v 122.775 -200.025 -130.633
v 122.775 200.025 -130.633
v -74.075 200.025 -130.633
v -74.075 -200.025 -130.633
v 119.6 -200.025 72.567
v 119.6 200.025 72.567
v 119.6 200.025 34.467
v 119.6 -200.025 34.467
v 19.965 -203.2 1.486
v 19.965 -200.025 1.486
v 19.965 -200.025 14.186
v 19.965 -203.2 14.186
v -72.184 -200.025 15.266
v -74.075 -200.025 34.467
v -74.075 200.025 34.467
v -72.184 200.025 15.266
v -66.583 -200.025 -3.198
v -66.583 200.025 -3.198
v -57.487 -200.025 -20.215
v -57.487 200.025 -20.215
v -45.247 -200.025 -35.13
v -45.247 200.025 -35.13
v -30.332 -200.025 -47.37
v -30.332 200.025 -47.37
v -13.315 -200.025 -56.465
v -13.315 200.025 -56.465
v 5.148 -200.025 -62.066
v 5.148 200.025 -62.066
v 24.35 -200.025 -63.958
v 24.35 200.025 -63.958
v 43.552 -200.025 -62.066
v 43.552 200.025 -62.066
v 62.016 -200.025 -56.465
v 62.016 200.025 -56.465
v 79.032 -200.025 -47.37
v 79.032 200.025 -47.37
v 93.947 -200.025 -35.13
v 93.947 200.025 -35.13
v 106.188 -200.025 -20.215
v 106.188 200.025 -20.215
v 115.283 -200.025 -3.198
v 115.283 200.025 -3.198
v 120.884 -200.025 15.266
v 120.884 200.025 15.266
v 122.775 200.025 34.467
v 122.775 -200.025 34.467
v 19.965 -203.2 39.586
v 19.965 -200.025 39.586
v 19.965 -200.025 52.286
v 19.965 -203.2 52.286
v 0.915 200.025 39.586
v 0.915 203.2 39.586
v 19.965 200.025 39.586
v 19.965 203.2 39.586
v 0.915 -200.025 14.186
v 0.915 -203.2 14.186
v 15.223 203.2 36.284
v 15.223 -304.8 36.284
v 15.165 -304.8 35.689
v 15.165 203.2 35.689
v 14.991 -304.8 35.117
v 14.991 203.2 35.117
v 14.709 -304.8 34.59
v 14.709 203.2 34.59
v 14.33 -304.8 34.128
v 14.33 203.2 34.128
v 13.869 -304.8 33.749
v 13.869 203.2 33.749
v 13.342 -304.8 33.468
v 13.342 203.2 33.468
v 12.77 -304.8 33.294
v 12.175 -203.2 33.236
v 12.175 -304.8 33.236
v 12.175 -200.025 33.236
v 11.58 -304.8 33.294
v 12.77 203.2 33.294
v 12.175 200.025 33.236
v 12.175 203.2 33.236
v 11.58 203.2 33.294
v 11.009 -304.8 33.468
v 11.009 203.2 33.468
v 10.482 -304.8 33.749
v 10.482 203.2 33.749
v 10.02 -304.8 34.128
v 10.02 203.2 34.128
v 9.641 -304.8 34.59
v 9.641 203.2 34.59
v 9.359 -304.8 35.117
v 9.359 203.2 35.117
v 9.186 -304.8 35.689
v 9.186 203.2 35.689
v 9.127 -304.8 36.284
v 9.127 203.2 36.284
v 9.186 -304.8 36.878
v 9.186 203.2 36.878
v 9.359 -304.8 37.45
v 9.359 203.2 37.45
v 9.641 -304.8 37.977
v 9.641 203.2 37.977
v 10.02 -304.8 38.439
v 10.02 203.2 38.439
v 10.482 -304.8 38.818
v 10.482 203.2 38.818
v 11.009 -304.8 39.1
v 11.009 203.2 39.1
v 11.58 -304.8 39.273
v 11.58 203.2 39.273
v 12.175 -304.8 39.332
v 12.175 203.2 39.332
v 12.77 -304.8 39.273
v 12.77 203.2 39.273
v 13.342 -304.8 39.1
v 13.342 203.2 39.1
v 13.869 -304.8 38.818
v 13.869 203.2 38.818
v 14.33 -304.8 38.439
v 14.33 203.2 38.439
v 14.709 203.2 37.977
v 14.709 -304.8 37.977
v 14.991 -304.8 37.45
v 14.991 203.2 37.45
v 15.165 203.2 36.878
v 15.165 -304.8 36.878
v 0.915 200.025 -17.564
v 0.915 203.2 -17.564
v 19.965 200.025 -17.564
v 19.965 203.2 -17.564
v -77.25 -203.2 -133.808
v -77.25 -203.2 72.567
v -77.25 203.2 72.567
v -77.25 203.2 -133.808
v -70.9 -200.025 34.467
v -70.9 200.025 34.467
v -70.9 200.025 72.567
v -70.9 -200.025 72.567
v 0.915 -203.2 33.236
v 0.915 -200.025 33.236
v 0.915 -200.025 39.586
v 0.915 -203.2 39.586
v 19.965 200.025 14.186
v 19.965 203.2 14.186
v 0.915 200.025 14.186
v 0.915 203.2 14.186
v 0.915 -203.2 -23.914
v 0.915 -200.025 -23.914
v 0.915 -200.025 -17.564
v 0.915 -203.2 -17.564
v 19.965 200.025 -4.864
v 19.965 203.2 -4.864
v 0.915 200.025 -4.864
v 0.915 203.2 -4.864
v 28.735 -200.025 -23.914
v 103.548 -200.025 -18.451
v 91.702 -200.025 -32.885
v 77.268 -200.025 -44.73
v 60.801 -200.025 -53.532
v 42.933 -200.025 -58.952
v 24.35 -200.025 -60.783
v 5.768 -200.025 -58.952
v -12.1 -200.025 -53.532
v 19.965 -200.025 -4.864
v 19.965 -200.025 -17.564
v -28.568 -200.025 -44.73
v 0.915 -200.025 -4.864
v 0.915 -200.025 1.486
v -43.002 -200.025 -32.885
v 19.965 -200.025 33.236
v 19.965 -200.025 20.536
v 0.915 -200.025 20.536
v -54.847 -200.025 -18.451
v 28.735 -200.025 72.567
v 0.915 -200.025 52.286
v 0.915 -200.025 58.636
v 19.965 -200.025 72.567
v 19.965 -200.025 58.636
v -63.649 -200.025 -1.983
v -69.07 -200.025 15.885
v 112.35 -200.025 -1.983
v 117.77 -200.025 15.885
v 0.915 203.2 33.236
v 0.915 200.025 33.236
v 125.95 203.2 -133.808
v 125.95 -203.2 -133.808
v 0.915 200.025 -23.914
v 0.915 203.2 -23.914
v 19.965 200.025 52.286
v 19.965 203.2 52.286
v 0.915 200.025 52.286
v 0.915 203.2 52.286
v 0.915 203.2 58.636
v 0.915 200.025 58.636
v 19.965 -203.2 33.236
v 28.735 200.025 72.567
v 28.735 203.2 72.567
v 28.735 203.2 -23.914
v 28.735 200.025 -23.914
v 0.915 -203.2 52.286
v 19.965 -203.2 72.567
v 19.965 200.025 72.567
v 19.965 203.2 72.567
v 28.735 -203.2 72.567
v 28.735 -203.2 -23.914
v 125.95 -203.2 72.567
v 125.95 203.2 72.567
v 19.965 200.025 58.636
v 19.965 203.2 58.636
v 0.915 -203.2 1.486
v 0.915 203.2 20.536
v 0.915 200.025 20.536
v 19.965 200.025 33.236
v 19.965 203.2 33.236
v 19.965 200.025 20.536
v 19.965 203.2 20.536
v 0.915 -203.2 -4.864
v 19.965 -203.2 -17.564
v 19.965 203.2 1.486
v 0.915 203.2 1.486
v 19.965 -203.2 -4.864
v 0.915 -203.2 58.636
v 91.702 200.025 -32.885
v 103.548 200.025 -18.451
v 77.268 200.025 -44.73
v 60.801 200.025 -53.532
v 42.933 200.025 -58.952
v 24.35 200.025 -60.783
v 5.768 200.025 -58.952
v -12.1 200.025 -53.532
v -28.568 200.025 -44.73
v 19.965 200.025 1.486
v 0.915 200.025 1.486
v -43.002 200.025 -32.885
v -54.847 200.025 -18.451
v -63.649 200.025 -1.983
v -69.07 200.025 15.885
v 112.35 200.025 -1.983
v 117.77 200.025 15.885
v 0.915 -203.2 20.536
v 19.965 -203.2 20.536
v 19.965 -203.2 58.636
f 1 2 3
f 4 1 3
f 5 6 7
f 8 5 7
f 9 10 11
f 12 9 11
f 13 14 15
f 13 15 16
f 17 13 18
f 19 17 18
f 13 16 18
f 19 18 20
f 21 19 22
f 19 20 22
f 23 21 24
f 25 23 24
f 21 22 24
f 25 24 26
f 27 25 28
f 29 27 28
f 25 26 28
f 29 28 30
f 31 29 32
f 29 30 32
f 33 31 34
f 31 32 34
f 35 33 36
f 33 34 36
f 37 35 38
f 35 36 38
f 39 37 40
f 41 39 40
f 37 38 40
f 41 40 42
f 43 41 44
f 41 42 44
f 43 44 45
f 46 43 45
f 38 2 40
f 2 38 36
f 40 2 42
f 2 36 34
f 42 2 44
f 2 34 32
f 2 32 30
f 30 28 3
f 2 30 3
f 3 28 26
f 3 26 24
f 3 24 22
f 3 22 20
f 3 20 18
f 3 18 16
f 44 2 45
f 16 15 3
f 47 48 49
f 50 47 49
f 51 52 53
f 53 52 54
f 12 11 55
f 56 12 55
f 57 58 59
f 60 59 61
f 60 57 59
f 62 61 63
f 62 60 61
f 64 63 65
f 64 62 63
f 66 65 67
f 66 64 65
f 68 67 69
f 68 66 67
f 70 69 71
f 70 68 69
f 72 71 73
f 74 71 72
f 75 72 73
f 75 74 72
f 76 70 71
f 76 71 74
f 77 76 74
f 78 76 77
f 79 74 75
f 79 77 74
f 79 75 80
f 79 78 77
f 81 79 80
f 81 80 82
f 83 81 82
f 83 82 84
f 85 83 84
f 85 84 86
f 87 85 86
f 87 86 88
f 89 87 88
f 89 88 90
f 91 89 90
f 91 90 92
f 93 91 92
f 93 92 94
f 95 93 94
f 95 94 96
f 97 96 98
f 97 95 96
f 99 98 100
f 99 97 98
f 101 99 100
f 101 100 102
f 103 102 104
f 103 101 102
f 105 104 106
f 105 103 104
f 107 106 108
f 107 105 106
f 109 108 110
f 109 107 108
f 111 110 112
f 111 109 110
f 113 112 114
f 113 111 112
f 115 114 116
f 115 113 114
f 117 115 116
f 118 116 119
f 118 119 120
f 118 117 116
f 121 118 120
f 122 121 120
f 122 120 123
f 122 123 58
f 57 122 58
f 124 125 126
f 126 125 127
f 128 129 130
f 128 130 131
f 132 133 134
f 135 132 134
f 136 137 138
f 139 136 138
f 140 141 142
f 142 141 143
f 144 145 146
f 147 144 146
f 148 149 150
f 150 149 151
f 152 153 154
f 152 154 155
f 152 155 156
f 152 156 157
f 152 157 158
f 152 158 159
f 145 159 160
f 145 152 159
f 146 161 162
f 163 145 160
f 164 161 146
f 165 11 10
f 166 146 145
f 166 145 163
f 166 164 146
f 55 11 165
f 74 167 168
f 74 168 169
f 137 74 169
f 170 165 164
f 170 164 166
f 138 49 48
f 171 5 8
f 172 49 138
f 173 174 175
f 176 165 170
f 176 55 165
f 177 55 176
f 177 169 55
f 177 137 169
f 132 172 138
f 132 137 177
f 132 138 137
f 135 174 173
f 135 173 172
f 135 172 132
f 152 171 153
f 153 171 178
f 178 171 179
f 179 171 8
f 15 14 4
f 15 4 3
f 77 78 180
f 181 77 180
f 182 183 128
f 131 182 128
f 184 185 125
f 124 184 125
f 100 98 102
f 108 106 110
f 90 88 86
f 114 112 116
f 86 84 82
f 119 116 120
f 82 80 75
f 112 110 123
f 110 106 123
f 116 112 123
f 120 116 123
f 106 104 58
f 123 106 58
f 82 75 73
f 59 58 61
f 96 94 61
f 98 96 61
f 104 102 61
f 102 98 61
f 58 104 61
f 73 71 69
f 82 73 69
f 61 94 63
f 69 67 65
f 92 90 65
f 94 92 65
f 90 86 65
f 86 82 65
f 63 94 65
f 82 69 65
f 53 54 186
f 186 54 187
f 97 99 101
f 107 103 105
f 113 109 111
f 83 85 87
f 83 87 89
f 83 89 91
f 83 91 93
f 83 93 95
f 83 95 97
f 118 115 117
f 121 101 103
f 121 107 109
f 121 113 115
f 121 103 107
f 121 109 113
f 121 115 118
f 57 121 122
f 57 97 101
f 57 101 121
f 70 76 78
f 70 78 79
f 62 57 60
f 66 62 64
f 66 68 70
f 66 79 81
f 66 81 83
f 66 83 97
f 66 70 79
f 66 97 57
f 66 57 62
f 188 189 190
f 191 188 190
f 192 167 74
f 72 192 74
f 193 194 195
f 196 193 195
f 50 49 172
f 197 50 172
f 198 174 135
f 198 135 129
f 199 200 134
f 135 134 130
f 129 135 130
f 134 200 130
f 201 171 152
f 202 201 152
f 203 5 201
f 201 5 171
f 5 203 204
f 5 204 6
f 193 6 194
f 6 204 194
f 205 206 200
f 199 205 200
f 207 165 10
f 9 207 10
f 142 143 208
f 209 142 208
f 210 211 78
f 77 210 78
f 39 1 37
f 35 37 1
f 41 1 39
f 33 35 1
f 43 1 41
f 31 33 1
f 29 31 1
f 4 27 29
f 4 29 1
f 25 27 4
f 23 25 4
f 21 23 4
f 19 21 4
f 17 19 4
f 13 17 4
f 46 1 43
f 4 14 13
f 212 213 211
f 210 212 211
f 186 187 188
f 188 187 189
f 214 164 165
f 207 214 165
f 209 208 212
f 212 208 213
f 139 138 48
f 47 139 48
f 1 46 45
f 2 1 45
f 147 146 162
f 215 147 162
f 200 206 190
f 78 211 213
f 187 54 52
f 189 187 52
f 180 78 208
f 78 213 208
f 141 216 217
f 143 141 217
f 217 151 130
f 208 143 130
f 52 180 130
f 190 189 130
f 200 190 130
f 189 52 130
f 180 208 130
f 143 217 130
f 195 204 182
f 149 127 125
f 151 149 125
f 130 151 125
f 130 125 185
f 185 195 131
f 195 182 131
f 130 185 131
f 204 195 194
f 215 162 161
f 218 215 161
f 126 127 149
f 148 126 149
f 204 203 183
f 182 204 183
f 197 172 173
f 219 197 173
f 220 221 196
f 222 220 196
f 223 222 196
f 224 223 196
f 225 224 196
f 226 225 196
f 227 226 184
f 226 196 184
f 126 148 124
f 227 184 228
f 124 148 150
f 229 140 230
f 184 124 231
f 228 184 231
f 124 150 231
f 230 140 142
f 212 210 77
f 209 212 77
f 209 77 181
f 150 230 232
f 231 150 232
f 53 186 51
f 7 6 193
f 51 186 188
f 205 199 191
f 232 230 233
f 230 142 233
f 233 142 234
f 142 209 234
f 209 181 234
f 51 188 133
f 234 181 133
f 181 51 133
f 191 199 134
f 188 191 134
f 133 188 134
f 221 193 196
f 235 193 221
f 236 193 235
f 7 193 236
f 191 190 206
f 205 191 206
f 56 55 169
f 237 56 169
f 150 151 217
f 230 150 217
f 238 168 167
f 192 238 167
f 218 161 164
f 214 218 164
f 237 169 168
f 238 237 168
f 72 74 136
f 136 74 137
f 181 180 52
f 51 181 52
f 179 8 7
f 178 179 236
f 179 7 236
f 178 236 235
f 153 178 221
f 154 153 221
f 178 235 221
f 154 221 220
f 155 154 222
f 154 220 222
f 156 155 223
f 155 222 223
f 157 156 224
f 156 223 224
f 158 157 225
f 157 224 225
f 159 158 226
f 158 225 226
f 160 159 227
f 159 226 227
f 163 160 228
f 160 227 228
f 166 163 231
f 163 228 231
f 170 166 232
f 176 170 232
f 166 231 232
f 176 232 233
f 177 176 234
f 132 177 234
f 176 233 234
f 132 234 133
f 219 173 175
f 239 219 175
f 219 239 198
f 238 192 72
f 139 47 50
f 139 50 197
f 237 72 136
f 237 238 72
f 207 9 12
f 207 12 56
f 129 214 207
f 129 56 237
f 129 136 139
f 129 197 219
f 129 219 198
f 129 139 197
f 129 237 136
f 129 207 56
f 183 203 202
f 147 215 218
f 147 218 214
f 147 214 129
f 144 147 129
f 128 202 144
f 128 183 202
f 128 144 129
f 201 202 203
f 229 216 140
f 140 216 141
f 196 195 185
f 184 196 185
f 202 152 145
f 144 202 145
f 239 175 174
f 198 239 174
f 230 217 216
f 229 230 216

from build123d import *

# Parameters (mm, degrees)
F0_W      = 203.2
F0_H      = 406.4
F0_W_2    = 196.85
F0_H_2    = 400.05
F1_DEPTH  = 203.2
F2_W      = 203.2
F2_H      = 3.175
F3_DEPTH  = 406.4
F5_DEPTH  = 406.401
F7_DEPTH  = 400.05
F8_R      = 3.048
F9_DEPTH  = 508
F10_ANGLE = 180


# Not quite as in the source:
# - a feature names something its author has since deleted; it is built from what else it names


with BuildPart() as f1:
    # F0 (on Top) → F1 (new body)
    with BuildSketch(Plane.XY):
        Rectangle(F0_W, F0_H)
        Rectangle(F0_W_2, F0_H_2, mode=Mode.SUBTRACT)
    extrude(amount=F1_DEPTH)

    # F2 (on face) → F3 (join)
    with BuildSketch(Plane.XZ.offset(203.2)):
        with Locations((0, 204.7875)):
            Rectangle(F2_W, F2_H)
    extrude(amount=-F3_DEPTH)

    # F4 (on face) → F5 (cut, through all)
    with BuildSketch(Plane(origin=(0, 203.2, 0), x_dir=(-1, 0, 0), z_dir=(0, 1, 0))):
        Polygon((-4.3847840279, 0), (4.3847840279, 0), (4.3847840279, 96.4816804707), (-4.3847840279, 96.4816804707), (-23.4347840279, 96.4816804707), (-23.4347840279, 90.1316804707), (-4.3847840279, 90.1316804707), (-4.3847840279, 77.4316804707), (-23.4347840279, 77.4316804707), (-23.4347840279, 71.0816804707), (-4.3847840279, 71.0816804707), (-4.3847840279, 58.3816804707), (-23.4347840279, 58.3816804707), (-23.4347840279, 52.0316804707), (-4.3847840279, 52.0316804707), (-4.3847840279, 39.3316804707), (-23.4347840279, 39.3316804707), (-23.4347840279, 32.9816804707), (-4.3847840279, 32.9816804707), (-4.3847840279, 20.2816804707), (-23.4347840279, 20.2816804707), (-23.4347840279, 13.9316804707), (-4.3847840279, 13.9316804707), align=None)
    extrude(amount=-F5_DEPTH, mode=Mode.SUBTRACT)

    # F6 (on face) → F7 (join, through all)
    with BuildSketch(Plane.XZ.offset(-200.025)):
        with BuildLine():
            Line((95.25, 0), (98.425, 0))
            Line((98.425, 0), (98.425, 38.1))
            ThreePointArc((98.425, 38.1), (0, 136.525), (-98.425, 38.1))
            Line((-98.425, 38.1), (-98.425, 0))
            Line((-98.425, 0), (-95.25, 0))
            Line((-95.25, 0), (-95.25, 38.1))
            ThreePointArc((-95.25, 38.1), (0, 133.35), (95.25, 38.1))
            Line((95.25, 38.1), (95.25, 0))
        make_face()
    extrude(amount=F7_DEPTH)

    # F8 (on face) → F9 (join)
    with BuildSketch(Plane(origin=(0, 203.2, 0), x_dir=(-1, 0, 0), z_dir=(0, 1, 0))):
        with Locations((-12.1751278639, 36.2836804707)):
            Circle(F8_R)
    extrude(amount=-F9_DEPTH)


with BuildPart() as f1_1:
    # F10: moved
    add(f1.part.rotate(Axis((12.1751278639, 203.2, 36.2836804707), (0, 1, 0)), F10_ANGLE))


solid = f1_1.part
